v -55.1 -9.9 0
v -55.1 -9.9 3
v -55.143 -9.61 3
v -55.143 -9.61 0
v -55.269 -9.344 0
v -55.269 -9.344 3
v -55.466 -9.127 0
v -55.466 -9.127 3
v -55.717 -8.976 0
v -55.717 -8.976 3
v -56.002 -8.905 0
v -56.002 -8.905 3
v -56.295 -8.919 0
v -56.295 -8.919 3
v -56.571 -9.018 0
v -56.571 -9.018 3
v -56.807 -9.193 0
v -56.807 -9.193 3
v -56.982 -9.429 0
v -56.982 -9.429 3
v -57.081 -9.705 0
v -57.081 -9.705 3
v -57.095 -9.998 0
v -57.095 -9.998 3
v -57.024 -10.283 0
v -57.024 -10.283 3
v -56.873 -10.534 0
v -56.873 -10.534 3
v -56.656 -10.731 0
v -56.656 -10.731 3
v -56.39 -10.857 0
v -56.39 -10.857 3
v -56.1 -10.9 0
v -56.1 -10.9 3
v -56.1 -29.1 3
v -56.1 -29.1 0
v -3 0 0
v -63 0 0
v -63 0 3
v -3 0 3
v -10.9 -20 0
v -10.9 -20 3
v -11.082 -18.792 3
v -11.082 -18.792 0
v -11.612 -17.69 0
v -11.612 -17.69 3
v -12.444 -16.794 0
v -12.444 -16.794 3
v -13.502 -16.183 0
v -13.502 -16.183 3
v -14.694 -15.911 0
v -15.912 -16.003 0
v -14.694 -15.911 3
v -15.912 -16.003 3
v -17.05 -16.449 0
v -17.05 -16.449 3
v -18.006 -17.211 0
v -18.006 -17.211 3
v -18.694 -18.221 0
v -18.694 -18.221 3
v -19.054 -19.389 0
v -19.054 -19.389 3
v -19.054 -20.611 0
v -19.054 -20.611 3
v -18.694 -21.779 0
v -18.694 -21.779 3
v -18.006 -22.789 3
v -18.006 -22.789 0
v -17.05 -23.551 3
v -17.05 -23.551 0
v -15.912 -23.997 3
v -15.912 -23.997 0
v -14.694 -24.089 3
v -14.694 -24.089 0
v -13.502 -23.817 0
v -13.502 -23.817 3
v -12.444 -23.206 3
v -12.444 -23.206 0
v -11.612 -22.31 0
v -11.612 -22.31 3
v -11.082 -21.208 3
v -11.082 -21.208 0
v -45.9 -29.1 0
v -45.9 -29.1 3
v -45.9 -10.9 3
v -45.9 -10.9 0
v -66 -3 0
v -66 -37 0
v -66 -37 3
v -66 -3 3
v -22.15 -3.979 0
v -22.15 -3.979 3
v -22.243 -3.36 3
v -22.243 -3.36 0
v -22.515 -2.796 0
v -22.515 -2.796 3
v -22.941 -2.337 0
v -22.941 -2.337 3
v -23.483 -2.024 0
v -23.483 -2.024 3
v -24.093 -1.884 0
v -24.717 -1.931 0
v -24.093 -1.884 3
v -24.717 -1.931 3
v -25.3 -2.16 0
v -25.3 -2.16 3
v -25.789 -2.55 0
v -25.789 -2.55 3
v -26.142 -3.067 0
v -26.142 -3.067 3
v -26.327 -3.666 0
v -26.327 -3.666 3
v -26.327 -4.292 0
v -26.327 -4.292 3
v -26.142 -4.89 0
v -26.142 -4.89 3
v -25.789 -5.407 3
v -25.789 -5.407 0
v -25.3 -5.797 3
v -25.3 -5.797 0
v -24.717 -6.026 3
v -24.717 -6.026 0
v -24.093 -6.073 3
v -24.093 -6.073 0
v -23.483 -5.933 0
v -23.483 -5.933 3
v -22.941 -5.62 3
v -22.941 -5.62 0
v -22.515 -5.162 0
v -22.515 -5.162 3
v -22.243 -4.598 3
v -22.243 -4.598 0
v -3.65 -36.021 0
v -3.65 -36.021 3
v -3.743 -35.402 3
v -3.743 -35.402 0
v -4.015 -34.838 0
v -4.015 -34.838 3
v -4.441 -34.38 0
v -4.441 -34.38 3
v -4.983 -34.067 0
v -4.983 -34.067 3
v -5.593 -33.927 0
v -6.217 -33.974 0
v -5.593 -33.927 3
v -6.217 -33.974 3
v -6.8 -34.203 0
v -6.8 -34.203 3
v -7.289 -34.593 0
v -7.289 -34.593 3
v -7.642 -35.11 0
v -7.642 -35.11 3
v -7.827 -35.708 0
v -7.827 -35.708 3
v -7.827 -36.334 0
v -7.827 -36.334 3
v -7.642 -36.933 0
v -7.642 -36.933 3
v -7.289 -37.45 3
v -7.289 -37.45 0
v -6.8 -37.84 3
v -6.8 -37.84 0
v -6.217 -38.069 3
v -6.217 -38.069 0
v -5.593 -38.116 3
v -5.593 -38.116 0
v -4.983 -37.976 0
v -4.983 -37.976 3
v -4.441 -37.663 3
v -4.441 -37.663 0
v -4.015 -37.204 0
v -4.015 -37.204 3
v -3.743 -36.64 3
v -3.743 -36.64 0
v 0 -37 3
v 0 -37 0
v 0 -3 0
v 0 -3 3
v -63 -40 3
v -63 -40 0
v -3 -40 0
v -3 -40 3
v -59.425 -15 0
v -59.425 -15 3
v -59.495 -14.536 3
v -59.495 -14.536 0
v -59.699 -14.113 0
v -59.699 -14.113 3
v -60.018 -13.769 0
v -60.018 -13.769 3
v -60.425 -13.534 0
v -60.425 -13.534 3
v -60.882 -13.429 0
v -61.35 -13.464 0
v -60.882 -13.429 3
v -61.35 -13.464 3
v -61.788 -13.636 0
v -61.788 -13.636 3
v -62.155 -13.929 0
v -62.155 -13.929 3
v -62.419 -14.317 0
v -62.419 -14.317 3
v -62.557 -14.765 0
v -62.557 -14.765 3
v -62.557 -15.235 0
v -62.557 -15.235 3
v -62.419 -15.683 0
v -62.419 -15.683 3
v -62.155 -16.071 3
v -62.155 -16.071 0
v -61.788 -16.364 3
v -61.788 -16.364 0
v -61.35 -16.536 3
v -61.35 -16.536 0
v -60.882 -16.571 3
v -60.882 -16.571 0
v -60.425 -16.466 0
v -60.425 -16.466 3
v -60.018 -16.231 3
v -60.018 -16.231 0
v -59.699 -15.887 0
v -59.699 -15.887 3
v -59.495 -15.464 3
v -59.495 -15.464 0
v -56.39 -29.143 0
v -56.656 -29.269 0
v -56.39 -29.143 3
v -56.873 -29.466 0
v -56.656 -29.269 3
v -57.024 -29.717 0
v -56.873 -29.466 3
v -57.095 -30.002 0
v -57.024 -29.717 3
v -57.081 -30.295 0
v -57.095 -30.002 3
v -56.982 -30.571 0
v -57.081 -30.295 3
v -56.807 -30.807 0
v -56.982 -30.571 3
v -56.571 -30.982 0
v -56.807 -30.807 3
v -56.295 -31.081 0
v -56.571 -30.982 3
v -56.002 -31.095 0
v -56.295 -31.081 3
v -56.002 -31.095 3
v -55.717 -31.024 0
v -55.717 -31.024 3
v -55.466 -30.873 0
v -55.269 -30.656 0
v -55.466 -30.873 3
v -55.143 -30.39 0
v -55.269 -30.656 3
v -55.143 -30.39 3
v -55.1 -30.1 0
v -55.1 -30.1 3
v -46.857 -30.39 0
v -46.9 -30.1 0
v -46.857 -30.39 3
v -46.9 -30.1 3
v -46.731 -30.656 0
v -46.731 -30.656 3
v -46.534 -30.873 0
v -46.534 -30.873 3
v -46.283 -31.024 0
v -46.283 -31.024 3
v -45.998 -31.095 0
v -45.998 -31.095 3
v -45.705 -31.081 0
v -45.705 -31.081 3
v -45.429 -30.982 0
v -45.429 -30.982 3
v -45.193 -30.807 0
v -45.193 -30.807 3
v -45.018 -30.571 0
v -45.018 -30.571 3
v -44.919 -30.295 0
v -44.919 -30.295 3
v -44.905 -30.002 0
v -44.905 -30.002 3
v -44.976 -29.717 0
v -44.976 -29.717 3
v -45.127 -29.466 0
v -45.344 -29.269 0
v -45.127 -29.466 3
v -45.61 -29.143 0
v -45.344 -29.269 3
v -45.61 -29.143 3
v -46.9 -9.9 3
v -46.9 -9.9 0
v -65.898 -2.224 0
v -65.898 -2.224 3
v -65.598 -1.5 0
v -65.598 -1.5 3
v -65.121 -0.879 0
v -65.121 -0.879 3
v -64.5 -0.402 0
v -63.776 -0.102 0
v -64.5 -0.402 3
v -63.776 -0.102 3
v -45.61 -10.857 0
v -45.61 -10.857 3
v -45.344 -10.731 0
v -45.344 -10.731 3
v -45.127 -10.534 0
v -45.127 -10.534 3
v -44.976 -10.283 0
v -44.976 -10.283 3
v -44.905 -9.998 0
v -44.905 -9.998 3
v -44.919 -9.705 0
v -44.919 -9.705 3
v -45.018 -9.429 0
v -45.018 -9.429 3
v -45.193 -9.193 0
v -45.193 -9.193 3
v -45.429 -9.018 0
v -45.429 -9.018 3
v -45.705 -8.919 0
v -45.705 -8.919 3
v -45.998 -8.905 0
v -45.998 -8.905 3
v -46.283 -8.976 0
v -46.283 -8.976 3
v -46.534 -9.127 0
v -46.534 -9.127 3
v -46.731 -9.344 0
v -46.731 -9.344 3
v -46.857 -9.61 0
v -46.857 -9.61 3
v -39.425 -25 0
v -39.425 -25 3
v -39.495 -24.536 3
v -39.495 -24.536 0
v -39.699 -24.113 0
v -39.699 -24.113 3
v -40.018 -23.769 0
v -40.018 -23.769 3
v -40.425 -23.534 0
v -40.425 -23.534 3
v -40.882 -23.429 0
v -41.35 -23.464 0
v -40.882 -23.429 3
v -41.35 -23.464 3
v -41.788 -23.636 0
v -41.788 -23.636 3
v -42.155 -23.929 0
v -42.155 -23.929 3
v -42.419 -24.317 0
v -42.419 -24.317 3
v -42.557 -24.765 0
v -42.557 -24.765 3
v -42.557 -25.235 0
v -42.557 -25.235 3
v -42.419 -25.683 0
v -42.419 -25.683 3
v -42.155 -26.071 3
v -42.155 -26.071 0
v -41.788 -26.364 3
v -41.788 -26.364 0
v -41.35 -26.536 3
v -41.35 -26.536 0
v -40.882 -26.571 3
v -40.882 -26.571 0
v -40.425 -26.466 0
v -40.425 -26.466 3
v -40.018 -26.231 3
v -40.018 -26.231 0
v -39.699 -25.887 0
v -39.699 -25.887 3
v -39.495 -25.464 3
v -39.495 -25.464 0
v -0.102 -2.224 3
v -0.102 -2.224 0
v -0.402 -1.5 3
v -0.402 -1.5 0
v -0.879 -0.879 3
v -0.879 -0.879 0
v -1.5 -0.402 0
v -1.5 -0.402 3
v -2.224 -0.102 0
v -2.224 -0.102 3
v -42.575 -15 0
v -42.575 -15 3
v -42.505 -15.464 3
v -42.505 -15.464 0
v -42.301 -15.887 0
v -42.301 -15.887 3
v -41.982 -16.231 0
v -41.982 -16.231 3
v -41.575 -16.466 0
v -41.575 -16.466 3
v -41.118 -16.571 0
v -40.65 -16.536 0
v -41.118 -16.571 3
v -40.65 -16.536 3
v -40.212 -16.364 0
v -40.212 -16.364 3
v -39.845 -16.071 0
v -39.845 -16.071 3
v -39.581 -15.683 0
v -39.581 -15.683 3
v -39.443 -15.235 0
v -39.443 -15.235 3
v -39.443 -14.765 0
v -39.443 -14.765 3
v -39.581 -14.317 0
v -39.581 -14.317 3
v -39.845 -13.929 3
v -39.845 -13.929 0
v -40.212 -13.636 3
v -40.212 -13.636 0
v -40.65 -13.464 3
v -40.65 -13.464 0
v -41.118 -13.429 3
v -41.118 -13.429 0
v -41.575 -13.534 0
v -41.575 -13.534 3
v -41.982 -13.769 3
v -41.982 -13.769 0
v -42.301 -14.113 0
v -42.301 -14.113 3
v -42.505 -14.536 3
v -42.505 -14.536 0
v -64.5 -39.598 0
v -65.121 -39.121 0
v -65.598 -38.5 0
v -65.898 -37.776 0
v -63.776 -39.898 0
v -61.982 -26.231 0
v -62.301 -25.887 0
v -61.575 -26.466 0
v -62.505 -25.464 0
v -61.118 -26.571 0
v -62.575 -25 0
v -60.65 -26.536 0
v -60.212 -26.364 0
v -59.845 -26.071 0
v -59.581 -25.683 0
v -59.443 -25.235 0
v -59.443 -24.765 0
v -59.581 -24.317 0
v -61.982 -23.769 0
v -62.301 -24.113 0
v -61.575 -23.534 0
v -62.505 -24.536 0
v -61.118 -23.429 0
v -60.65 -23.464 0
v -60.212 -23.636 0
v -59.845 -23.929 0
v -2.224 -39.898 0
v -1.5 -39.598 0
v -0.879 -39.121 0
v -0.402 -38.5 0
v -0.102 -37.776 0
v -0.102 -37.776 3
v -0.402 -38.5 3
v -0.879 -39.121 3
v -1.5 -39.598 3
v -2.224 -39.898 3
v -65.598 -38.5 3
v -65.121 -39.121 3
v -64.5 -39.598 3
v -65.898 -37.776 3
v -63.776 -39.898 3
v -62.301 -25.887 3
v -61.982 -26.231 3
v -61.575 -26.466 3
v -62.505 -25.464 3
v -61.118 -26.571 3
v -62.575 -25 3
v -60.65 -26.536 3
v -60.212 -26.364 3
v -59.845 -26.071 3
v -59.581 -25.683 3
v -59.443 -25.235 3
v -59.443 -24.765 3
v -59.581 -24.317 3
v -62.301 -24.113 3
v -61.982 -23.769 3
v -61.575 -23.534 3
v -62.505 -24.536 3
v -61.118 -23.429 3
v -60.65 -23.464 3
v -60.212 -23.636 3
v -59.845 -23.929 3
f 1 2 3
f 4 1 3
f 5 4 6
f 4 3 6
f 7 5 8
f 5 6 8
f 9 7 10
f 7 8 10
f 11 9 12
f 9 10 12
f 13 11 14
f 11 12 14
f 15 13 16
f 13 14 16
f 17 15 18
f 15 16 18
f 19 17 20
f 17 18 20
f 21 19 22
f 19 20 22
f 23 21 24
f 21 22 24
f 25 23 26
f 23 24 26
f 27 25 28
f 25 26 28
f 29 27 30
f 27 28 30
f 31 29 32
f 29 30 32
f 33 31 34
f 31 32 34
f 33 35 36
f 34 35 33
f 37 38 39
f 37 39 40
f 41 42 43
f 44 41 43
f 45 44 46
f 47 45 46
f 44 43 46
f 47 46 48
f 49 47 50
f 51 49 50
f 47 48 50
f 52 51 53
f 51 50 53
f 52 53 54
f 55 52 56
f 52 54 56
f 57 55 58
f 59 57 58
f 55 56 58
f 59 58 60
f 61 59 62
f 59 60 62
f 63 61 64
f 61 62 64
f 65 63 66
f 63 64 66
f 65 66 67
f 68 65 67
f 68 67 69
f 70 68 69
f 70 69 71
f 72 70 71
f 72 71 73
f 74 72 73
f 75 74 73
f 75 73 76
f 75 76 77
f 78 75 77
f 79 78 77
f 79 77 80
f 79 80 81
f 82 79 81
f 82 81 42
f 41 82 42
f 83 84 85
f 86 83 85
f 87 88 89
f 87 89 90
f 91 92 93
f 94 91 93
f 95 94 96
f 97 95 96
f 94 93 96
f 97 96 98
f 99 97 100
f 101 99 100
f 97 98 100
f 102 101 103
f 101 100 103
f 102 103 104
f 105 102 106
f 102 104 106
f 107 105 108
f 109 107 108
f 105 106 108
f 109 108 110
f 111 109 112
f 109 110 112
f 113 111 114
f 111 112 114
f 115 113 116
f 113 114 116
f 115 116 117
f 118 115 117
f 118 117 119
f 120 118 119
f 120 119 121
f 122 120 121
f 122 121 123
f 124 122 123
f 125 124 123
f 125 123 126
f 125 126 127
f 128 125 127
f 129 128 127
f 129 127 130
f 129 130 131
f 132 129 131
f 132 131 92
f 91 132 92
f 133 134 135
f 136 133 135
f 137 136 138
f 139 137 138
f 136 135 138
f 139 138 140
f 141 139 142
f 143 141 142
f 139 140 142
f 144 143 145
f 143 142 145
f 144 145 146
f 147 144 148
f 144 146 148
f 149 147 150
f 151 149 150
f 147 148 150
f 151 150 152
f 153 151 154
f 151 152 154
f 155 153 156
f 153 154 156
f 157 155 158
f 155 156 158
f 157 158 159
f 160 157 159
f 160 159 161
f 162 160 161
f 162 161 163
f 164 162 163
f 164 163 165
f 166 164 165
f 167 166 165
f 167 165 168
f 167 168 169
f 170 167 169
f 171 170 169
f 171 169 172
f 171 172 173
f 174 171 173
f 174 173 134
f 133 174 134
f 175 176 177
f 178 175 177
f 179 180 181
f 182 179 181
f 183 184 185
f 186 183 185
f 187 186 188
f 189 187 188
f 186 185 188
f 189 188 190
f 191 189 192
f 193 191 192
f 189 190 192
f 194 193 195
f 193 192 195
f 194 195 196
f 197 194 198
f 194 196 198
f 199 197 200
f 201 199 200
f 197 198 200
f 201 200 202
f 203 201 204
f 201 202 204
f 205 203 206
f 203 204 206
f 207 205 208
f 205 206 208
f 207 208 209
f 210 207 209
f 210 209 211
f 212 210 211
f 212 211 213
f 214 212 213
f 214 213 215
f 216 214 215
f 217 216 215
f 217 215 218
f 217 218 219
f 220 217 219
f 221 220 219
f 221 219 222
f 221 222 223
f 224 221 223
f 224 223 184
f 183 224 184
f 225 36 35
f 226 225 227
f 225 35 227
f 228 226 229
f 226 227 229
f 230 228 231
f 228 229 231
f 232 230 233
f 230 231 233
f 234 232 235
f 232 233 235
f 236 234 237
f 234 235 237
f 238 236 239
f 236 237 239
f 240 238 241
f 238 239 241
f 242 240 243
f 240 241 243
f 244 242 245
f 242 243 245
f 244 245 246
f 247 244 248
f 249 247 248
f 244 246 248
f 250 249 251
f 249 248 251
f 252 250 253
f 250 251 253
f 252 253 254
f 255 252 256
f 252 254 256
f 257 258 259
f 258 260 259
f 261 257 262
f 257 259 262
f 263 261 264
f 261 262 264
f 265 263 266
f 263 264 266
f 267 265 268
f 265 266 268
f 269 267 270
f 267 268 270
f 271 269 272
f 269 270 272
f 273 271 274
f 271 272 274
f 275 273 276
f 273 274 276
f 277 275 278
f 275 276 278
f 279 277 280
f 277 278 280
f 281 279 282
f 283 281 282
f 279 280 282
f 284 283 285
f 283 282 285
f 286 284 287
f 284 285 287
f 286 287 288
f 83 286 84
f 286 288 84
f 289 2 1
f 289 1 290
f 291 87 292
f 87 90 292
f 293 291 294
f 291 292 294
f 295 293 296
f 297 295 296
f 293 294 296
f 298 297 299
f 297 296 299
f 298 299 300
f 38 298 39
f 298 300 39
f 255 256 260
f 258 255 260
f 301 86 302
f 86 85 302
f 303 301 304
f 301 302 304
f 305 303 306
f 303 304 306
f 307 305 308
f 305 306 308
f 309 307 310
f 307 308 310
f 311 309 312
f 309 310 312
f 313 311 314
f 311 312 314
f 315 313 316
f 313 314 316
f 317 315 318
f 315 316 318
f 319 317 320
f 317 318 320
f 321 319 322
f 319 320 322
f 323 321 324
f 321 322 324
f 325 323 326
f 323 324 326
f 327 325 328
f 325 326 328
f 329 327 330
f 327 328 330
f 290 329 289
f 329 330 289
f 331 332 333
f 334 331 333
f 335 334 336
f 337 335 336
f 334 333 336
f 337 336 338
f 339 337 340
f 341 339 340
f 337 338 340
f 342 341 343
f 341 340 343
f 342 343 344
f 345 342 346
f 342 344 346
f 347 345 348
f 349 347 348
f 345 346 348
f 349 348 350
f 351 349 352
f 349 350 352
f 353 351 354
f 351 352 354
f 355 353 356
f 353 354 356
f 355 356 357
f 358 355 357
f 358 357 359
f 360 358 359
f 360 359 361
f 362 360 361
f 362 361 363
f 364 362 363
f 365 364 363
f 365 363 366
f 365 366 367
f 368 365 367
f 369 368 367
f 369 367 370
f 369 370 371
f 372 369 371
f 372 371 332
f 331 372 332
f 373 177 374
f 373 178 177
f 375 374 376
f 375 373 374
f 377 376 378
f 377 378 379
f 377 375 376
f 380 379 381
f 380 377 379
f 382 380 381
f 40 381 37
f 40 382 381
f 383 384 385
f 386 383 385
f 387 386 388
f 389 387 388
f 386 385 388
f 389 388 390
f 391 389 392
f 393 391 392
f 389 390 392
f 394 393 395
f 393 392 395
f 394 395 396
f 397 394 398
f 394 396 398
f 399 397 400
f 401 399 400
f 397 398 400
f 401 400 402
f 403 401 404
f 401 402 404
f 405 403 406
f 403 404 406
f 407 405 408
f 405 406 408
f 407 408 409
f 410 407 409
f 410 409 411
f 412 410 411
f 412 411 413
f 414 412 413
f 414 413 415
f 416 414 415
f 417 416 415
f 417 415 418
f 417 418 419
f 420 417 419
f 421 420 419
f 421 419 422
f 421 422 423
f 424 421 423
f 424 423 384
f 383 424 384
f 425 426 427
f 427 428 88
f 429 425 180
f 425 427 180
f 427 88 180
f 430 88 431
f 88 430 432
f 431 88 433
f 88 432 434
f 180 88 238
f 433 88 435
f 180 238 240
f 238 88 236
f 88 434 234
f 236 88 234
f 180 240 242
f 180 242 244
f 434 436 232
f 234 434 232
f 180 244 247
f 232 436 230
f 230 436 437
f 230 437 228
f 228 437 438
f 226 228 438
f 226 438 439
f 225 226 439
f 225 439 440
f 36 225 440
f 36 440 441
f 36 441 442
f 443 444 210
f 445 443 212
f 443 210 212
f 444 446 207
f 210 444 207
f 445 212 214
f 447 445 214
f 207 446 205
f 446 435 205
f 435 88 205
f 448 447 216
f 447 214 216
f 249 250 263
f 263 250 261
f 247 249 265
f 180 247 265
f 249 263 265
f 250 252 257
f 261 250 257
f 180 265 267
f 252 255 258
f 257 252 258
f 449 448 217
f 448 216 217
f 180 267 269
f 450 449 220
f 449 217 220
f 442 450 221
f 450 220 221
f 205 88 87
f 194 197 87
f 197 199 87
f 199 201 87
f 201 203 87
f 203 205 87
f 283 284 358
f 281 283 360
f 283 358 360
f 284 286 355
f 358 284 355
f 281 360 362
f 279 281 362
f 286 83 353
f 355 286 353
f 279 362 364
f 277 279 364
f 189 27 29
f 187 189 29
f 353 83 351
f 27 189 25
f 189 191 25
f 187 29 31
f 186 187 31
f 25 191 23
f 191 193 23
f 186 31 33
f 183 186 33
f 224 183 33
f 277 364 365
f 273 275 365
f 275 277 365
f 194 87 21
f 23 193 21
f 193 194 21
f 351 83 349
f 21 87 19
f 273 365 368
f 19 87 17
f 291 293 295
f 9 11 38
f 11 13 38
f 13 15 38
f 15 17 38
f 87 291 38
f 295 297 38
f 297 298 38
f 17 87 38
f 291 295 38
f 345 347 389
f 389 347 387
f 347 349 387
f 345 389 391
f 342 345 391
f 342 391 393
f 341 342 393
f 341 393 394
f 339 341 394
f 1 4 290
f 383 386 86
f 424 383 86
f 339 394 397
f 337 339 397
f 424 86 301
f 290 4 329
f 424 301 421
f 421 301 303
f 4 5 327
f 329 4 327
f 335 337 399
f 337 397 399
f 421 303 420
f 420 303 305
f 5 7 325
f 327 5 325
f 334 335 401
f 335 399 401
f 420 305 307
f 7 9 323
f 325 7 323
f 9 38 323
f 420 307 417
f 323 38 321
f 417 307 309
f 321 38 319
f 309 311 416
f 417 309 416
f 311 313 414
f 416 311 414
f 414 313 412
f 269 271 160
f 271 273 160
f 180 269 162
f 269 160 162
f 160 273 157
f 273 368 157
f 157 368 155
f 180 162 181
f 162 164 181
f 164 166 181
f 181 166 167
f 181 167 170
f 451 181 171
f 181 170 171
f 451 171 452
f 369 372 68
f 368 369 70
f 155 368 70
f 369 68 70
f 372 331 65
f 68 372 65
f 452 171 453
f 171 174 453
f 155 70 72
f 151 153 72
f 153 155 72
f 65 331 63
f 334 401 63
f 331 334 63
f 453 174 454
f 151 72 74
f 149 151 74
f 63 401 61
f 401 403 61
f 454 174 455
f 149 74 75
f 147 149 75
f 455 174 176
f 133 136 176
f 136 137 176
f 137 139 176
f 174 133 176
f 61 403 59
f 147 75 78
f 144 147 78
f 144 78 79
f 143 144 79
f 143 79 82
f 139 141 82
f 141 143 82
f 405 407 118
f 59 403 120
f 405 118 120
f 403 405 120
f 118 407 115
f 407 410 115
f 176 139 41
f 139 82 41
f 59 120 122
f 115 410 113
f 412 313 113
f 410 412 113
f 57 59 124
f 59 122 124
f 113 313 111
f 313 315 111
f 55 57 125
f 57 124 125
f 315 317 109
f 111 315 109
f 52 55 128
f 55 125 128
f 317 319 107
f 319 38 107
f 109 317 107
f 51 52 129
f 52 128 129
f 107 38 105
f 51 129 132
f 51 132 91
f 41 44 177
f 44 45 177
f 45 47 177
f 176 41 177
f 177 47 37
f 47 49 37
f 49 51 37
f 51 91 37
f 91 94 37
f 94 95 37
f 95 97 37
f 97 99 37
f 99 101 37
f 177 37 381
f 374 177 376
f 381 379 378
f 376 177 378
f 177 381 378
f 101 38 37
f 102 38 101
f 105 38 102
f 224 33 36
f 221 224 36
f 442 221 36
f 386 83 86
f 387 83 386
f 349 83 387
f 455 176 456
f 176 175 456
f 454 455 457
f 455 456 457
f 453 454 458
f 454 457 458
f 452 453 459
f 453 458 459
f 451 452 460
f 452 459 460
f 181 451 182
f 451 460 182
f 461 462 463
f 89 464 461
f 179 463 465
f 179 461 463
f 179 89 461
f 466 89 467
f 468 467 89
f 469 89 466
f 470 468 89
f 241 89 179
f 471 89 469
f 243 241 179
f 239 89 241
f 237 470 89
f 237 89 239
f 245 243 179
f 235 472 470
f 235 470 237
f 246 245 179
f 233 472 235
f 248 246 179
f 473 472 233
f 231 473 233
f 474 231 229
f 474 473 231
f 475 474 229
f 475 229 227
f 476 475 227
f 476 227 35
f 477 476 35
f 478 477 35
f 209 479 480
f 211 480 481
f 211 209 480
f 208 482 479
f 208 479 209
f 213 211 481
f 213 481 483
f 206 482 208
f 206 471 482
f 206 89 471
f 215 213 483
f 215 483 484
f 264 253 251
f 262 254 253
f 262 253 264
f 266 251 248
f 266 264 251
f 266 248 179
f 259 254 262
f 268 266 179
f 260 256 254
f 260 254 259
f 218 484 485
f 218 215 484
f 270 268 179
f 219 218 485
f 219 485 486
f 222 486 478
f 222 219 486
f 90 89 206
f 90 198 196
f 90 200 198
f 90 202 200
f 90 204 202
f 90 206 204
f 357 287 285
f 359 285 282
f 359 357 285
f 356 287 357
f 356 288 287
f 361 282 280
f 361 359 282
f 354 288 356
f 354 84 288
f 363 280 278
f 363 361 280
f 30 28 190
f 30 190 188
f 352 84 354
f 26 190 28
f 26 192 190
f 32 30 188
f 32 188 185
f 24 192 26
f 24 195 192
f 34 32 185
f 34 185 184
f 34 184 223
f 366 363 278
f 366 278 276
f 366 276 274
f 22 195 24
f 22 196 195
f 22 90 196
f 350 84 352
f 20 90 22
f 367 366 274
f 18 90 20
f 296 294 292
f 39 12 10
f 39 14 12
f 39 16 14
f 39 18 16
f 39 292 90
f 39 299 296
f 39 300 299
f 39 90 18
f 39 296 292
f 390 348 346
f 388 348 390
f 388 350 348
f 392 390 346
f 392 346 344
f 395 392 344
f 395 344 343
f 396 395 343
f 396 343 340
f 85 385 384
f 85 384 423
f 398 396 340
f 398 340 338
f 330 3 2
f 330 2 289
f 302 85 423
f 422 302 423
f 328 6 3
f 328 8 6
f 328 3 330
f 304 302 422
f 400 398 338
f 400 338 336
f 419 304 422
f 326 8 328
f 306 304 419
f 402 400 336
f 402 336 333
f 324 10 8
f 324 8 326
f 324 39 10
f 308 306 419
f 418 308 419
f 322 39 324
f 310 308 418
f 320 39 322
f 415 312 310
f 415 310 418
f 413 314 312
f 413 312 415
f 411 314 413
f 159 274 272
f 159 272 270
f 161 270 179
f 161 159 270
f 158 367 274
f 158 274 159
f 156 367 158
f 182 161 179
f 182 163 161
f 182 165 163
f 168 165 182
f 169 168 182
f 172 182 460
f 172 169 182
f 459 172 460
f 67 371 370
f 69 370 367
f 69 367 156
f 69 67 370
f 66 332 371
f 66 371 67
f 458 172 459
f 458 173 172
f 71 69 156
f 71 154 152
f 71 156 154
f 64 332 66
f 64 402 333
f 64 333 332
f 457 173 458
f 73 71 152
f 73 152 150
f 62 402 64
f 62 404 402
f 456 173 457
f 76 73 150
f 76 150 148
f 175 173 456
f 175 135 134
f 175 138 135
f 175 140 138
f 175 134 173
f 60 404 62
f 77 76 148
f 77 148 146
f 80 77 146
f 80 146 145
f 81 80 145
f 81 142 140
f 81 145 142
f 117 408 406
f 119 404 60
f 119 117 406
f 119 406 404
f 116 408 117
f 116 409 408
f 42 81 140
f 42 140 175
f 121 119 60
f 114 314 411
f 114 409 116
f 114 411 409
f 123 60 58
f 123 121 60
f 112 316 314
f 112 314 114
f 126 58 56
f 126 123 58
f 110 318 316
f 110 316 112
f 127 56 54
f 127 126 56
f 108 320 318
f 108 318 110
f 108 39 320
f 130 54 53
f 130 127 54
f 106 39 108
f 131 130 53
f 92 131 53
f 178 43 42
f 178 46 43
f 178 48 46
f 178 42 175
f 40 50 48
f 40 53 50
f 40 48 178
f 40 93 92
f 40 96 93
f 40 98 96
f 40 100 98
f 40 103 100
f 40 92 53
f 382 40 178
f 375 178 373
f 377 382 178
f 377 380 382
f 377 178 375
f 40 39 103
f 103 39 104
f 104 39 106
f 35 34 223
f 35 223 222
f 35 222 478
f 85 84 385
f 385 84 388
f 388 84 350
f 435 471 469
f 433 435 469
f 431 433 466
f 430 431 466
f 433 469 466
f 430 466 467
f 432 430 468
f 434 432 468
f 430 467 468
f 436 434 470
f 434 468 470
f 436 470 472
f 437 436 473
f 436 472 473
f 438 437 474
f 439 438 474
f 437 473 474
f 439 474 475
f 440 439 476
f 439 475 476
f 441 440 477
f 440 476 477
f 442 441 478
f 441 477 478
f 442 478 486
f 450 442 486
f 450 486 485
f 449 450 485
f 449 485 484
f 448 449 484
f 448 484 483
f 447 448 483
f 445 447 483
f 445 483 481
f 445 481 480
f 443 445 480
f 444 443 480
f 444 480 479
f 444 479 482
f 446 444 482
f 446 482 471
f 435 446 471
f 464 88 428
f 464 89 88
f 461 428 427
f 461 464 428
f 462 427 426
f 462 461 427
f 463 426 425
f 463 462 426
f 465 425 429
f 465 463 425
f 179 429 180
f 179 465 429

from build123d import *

# Parameters (mm, degrees)
SKETCH_1_W          = 66
SKETCH_1_H          = 40
EXTRUDE_1_DEPTH     = 3
SKETCH_2_R          = 1.575
SKETCH_2_R_2        = 4.1
SKETCH_2_R_3        = 2.1
SKETCH_2_W          = 10.2
SKETCH_2_H          = 20.2
CUT_EXTRUDE_1_DEPTH = 78.233412459
SKETCH_3_R          = 1
CUT_EXTRUDE_2_DEPTH = 78.233412459
FILLET_1_R          = 3


with BuildPart() as part:
    # 草图1 → 凸台-拉伸1 (new body)
    with BuildSketch(Plane.XY):
        with Locations((-33, -20)):
            Rectangle(SKETCH_1_W, SKETCH_1_H)
    extrude(amount=EXTRUDE_1_DEPTH)

    # 草图2 → 切除-拉伸1 (cut, through all)
    with BuildSketch(Plane.XY.offset(3)):
        with Locations((-61, -15)):
            Circle(SKETCH_2_R)
        with Locations(Location((-61, -25, 0), (0, 0, 180))):
            Circle(SKETCH_2_R)
        with Locations((-41, -25)):
            Circle(SKETCH_2_R)
        with Locations(Location((-41, -15, 0), (0, 0, 180))):
            Circle(SKETCH_2_R)
        with Locations((-15, -20)):
            Circle(SKETCH_2_R_2)
        with Locations((-24.25, -3.97853003)):
            Circle(SKETCH_2_R_3)
        with Locations((-5.75, -36.02146997)):
            Circle(SKETCH_2_R_3)
        with Locations((-51, -20)):
            Rectangle(SKETCH_2_W, SKETCH_2_H)
    extrude(amount=-CUT_EXTRUDE_1_DEPTH, mode=Mode.SUBTRACT)

    # 草图3 → 切除-拉伸2 (cut, through all)
    with BuildSketch(Plane.XY.offset(3)):
        with Locations((-45.9, -9.9)):
            Circle(SKETCH_3_R)
        with Locations((-45.9, -30.1)):
            Circle(SKETCH_3_R)
        with Locations((-56.1, -30.1)):
            Circle(SKETCH_3_R)
        with Locations((-56.1, -9.9)):
            Circle(SKETCH_3_R)
    extrude(amount=-CUT_EXTRUDE_2_DEPTH, mode=Mode.SUBTRACT)

    # 圆角1
    fillet_1_edges = [part.edges().sort_by_distance(p)[0] for p in [
        (0, -40, 1.5),
        (-66, -40, 1.5),
        (-66, 0, 1.5),
        (0, 0, 1.5),
    ]]
    fillet(fillet_1_edges, radius=FILLET_1_R)


solid = part.part
